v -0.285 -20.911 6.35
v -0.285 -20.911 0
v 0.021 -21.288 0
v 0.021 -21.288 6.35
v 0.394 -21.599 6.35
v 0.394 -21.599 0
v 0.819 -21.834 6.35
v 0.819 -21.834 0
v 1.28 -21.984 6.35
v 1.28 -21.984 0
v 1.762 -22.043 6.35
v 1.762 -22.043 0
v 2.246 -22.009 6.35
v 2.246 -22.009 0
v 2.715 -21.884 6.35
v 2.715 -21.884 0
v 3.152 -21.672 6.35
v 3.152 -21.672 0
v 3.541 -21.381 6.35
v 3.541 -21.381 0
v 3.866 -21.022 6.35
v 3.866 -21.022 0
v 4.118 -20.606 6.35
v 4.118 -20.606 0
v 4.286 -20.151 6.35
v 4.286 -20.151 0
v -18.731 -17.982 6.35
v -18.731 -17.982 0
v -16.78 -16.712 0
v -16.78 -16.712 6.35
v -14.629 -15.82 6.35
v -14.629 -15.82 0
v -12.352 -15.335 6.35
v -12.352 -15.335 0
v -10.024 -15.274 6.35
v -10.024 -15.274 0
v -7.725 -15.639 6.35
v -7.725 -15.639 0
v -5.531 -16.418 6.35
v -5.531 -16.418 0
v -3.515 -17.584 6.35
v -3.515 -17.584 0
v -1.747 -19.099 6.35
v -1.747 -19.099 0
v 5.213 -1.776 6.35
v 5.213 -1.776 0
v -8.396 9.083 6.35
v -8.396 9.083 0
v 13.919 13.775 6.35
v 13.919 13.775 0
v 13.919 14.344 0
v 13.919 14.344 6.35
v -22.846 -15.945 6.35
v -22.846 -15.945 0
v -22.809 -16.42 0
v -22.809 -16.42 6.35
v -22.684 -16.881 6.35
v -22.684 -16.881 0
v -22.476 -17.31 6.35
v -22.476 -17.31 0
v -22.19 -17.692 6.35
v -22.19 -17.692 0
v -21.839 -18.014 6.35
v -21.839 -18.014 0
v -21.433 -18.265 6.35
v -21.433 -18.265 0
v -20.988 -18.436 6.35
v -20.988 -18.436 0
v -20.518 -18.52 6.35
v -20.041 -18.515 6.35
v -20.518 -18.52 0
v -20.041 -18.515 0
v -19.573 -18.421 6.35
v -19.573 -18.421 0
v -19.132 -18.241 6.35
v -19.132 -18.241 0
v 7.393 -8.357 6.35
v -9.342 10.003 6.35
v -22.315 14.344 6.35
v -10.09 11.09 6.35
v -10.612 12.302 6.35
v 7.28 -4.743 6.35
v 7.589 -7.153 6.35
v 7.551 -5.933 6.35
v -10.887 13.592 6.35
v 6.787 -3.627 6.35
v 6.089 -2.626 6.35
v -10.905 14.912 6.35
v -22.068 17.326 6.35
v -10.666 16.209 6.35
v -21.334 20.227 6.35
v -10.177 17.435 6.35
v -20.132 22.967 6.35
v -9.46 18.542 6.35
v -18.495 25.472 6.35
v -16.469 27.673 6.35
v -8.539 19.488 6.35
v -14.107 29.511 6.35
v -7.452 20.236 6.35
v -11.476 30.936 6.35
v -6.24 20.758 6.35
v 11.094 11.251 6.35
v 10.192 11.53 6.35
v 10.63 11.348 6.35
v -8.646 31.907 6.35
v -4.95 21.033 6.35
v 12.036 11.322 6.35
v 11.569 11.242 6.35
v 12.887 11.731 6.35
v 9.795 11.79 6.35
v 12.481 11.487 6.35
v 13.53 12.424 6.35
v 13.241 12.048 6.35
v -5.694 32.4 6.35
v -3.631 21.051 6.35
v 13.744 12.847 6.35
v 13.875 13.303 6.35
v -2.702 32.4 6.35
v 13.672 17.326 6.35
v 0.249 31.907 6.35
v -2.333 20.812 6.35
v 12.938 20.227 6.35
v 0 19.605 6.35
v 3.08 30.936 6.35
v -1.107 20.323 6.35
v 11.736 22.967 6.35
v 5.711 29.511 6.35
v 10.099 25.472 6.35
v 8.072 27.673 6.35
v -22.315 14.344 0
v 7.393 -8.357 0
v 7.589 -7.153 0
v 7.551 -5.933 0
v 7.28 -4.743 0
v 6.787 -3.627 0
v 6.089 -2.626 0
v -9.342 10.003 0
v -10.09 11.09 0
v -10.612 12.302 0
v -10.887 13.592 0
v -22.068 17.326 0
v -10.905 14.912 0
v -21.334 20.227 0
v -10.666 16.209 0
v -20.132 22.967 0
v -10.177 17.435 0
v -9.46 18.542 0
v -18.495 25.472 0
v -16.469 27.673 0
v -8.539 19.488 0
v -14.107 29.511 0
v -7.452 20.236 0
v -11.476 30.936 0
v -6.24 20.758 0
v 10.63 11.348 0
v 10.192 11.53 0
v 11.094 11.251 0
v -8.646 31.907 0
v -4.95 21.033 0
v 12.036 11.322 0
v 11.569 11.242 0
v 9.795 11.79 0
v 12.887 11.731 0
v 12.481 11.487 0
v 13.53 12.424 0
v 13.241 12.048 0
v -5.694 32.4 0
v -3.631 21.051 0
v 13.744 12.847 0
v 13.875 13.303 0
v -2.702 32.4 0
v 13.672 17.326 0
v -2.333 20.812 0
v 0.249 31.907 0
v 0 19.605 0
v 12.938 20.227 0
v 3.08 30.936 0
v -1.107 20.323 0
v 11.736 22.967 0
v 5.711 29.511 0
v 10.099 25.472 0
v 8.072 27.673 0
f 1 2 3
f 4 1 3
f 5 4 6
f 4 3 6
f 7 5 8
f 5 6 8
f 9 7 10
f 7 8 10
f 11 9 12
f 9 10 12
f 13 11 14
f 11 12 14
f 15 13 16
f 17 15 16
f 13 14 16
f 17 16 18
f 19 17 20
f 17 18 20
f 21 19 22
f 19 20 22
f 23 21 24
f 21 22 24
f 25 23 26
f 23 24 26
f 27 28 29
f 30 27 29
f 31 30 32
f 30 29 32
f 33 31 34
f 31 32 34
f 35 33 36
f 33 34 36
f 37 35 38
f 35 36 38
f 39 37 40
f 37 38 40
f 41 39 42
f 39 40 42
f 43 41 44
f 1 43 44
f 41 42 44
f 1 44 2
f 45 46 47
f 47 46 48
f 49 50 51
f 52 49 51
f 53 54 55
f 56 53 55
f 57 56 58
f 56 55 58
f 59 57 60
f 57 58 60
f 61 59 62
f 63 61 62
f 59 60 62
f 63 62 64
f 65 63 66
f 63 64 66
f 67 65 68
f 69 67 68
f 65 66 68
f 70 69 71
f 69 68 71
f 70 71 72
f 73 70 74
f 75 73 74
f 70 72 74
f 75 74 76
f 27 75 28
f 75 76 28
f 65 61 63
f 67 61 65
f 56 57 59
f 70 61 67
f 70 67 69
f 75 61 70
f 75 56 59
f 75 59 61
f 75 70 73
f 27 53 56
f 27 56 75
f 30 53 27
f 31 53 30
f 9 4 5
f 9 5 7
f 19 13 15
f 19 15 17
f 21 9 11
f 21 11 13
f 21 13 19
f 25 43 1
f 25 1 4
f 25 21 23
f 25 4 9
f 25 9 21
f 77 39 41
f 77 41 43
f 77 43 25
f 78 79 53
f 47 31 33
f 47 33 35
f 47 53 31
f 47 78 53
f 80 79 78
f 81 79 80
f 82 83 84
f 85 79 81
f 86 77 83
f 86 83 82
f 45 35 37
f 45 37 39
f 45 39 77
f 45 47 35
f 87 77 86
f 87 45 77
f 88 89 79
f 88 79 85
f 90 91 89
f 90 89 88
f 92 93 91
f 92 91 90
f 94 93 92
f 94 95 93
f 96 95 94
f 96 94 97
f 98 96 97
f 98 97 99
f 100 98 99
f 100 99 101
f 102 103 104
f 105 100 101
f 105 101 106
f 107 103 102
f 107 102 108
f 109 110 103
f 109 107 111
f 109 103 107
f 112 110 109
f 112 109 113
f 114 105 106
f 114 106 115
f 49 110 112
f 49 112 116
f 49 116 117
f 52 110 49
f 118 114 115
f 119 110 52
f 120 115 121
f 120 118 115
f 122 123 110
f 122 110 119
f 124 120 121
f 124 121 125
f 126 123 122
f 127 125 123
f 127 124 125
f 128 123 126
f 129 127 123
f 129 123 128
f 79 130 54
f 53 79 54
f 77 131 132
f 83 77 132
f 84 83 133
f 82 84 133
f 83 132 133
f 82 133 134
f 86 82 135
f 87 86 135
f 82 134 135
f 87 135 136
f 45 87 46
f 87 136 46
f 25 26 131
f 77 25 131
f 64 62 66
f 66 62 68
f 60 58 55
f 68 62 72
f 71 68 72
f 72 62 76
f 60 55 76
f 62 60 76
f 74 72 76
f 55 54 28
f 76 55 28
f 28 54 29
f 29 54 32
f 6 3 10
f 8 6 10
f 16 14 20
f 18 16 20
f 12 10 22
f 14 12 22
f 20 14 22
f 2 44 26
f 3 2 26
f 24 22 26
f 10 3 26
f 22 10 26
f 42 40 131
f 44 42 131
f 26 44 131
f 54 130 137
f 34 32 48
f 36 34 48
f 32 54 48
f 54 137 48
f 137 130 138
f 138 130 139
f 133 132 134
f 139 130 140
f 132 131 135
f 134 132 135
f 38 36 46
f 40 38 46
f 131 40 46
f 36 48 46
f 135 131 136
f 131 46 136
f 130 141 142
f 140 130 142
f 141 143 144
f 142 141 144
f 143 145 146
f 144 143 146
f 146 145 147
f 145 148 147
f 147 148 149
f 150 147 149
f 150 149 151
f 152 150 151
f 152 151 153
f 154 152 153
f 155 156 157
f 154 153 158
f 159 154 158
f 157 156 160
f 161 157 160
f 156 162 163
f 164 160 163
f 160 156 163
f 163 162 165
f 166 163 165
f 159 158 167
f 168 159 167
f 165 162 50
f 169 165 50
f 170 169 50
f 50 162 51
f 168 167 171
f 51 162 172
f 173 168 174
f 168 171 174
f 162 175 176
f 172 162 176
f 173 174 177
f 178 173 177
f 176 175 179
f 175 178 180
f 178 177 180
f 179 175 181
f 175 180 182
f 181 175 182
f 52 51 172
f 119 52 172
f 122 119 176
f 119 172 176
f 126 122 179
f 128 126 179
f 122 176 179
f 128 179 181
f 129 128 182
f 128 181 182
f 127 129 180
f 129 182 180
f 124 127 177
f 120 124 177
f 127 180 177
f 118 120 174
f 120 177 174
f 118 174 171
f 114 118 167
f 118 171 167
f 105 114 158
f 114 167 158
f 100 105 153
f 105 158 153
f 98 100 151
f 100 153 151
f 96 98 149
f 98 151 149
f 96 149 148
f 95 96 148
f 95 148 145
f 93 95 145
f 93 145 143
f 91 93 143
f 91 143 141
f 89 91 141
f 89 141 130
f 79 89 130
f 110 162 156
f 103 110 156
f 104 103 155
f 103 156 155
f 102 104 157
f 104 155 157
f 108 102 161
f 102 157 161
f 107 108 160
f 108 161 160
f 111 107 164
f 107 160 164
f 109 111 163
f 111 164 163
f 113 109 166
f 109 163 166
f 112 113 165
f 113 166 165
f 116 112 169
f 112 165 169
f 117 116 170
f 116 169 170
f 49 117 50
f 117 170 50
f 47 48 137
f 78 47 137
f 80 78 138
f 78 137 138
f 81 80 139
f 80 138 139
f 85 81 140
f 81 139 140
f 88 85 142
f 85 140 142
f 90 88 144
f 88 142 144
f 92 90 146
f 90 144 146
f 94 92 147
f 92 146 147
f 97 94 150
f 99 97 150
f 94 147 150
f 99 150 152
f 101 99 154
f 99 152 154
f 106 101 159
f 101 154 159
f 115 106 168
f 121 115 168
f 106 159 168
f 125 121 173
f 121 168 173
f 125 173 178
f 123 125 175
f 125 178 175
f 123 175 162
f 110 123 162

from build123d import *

# Parameters (mm, degrees)
F1_DEPTH = 6.35


with BuildPart() as f1:
    # F0 (on Top) → F1 (new body)
    with BuildSketch(Plane.XY):
        with BuildLine():
            ThreePointArc((-18.731252, -17.982043), (-8.866157, -15.404018), (-0.284833, -20.911031))
            ThreePointArc((-0.284833, -20.911031), (2.246411, -22.009452), (4.285943, -20.150948))
            Line((4.285943, -20.150948), (7.392956, -8.357487))
            ThreePointArc((7.392956, -8.357487), (7.28039, -4.743075), (5.212962, -1.776192))
            Line((5.212962, -1.776192), (-8.396228, 9.082717))
            ThreePointArc((-8.396228, 9.082717), (-9.459502, 18.542219), (0, 19.605493))
            Line((0, 19.605493), (9.795078, 11.789902))
            ThreePointArc((9.795078, 11.789902), (12.481031, 11.486723), (13.919272, 13.775331))
            Line((13.919272, 13.775331), (13.919272, 14.344105))
            ThreePointArc((13.919272, 14.344105), (-4.198114, 32.46149), (-22.315499, 14.344105))
            Line((-22.315499, 14.344105), (-22.845562, -15.94463))
            ThreePointArc((-22.845562, -15.94463), (-21.433128, -18.265271), (-18.731252, -17.982043))
        make_face()
    extrude(amount=F1_DEPTH)


solid = f1.part
